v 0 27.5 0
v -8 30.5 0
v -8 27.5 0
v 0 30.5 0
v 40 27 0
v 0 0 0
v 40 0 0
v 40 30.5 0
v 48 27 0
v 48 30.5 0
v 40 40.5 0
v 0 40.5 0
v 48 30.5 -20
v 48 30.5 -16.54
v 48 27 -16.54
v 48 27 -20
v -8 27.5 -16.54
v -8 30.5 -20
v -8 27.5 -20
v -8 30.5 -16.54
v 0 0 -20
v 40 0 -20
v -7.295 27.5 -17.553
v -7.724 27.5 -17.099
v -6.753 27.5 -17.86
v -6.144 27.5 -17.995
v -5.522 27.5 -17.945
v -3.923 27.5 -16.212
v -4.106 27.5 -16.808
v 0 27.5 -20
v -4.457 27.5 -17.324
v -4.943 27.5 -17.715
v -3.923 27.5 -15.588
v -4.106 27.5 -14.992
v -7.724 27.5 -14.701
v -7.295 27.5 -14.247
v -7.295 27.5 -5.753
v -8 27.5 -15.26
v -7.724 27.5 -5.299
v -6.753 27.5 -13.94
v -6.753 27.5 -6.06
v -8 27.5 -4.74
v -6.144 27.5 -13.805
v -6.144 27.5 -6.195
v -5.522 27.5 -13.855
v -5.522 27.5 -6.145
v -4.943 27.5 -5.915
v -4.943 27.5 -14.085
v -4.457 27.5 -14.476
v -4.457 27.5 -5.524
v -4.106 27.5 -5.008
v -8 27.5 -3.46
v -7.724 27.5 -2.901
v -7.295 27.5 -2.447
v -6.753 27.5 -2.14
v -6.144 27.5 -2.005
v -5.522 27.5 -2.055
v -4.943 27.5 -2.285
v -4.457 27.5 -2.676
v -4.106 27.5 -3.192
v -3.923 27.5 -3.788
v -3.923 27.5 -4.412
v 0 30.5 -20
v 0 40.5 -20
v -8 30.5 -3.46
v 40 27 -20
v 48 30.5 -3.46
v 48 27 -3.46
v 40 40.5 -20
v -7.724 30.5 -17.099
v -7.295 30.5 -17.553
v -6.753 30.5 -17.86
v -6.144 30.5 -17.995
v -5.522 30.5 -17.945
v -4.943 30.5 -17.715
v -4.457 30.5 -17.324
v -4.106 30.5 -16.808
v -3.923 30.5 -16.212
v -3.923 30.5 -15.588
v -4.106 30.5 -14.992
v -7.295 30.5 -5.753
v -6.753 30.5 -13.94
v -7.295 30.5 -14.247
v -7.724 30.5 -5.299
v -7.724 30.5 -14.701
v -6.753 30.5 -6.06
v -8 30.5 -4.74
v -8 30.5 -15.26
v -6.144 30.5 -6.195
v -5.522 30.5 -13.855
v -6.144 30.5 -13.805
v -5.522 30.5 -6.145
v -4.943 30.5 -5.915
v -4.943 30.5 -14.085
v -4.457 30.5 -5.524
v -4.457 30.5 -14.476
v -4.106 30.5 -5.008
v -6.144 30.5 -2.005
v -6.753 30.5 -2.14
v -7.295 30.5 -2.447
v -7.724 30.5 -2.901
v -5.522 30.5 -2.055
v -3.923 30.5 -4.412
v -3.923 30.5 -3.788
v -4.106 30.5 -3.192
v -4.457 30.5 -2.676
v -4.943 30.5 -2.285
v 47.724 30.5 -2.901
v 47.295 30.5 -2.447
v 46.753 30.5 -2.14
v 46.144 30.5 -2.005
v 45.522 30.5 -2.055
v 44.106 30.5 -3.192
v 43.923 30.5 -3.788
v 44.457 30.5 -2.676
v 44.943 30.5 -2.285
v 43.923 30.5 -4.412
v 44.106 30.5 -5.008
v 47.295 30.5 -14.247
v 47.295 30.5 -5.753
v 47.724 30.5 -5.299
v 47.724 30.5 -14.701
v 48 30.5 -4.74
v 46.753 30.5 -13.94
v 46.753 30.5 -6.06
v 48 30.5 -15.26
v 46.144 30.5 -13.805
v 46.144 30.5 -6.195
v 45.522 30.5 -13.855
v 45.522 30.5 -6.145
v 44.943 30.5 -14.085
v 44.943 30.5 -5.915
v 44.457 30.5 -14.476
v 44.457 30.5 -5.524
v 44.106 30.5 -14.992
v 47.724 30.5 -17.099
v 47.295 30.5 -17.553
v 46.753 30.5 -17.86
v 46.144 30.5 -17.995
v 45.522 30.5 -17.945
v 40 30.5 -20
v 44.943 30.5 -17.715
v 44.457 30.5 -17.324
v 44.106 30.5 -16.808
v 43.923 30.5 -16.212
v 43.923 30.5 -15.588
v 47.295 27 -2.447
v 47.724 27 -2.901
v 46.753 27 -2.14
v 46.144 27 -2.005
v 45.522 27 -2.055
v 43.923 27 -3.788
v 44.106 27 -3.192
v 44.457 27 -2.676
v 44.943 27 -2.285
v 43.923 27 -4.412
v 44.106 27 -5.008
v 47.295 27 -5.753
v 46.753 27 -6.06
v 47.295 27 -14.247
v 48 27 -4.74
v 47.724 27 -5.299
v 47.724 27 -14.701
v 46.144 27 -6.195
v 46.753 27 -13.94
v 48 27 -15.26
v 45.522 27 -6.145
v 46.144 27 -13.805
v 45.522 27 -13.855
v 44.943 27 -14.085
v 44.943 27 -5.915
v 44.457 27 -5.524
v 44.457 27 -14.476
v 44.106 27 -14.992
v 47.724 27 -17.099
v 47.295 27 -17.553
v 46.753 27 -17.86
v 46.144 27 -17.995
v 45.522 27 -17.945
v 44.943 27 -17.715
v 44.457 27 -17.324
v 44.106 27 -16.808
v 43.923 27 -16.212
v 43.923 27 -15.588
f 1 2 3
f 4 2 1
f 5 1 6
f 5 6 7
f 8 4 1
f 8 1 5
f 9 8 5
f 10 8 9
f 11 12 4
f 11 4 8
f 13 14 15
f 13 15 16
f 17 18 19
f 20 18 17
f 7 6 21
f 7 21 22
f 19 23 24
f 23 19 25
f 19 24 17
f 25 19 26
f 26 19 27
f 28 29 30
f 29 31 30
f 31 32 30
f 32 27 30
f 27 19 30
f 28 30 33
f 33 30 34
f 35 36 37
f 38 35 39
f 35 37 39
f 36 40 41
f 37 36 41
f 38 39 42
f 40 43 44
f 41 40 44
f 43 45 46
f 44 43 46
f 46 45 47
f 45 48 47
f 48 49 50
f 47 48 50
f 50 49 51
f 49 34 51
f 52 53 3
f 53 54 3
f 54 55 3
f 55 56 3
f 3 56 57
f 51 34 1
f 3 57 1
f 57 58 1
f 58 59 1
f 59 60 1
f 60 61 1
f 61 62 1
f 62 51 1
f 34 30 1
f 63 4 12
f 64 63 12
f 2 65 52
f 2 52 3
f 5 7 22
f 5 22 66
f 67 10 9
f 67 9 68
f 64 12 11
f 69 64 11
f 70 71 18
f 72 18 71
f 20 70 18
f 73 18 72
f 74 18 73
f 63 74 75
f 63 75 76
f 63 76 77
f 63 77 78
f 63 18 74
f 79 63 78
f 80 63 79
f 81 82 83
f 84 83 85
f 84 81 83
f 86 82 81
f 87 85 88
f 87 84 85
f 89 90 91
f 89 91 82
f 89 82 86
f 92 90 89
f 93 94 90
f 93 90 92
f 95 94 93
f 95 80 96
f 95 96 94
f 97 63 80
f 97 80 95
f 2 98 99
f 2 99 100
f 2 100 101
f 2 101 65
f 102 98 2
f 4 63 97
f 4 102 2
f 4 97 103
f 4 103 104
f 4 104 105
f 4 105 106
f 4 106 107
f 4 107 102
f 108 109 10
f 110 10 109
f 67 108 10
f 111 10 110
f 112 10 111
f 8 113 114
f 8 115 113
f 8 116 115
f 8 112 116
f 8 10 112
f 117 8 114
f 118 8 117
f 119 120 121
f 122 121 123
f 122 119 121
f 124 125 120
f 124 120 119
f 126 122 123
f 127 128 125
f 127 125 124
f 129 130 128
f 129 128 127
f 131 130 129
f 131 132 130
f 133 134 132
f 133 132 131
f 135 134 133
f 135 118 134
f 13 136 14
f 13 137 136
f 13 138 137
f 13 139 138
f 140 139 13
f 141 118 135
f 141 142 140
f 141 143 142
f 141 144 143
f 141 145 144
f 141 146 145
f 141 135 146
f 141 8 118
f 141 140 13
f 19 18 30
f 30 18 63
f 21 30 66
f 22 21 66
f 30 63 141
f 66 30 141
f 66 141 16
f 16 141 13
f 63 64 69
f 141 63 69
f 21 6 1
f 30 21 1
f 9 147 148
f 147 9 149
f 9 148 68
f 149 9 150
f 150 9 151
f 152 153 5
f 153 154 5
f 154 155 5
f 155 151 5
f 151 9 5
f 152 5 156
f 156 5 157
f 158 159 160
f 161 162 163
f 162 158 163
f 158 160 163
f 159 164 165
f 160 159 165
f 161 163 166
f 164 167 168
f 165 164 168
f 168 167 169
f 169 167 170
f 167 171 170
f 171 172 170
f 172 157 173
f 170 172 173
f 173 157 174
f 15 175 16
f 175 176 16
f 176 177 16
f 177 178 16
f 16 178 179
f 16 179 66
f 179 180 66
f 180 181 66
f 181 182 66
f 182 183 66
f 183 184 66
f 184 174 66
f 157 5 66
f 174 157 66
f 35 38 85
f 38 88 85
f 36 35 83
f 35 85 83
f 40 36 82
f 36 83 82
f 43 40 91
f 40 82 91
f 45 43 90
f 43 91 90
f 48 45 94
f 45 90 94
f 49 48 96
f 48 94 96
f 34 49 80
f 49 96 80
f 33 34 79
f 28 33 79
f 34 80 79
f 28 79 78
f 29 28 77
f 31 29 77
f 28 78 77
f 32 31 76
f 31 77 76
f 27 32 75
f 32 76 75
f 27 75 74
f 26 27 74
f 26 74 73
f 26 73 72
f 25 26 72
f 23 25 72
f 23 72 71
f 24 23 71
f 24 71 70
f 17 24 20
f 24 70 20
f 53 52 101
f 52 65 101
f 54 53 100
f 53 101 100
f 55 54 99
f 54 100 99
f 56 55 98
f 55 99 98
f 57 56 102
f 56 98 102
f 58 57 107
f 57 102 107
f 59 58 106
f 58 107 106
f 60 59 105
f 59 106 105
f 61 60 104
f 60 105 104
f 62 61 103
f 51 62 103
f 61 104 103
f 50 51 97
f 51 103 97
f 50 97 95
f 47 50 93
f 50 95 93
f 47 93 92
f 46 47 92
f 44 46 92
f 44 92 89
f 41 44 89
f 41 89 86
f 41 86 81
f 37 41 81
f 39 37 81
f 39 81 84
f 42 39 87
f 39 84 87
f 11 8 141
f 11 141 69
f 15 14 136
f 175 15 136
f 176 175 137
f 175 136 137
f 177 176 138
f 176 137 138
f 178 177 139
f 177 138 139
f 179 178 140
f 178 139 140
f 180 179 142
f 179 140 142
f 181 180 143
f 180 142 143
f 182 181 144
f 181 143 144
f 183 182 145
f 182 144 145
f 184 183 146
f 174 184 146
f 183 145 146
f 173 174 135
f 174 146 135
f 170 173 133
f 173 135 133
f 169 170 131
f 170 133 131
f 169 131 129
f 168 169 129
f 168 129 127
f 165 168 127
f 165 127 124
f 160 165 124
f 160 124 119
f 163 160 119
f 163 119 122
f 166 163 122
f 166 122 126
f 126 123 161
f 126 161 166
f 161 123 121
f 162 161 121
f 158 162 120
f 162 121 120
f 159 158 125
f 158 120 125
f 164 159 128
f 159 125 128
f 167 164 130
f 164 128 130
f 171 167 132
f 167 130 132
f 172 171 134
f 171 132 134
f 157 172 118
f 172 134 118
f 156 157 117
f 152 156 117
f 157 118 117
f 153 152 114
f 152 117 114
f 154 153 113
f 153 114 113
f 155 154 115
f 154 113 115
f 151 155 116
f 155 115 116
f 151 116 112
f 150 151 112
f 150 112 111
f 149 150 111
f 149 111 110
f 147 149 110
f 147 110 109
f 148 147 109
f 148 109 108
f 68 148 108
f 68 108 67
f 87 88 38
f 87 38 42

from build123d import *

# Parameters (mm, degrees)
SKETCH2_W           = 40
SKETCH2_H           = 40.5
BOSS_EXTRUDE1_DEPTH = 20
SKETCH3_W           = 20
SKETCH3_H           = 3.5
BOSS_EXTRUDE2_DEPTH = 8
SKETCH4_R           = 2.1
CUT_EXTRUDE1_DEPTH  = 8
SKETCH5_W           = 20
SKETCH5_H           = 3
BOSS_EXTRUDE3_DEPTH = 8
SKETCH6_R           = 2.1
CUT_EXTRUDE2_DEPTH  = 8


with BuildPart() as part:
    # Sketch2 → Boss-Extrude1 (new body)
    with BuildSketch(Plane.XY):
        with Locations((20, 20.25)):
            Rectangle(SKETCH2_W, SKETCH2_H)
    extrude(amount=-BOSS_EXTRUDE1_DEPTH)

    # Sketch3 → Boss-Extrude2 (add)
    with BuildSketch(Plane(origin=(40, 0, 0), x_dir=(0, 0, -1), z_dir=(1, 0, 0))):
        with Locations((10, 28.75)):
            Rectangle(SKETCH3_W, SKETCH3_H)
    extrude(amount=BOSS_EXTRUDE2_DEPTH)

    # Sketch4 → Cut-Extrude1 (cut)
    with BuildSketch(Plane(origin=(0, 30.5, 0), x_dir=(1, 0, 0), z_dir=(0, 1, 0))):
        with Locations((46, 15.9)):
            Circle(SKETCH4_R)
        with Locations((46, 4.1)):
            Circle(SKETCH4_R)
    extrude(amount=-CUT_EXTRUDE1_DEPTH, mode=Mode.SUBTRACT)

    # Sketch5 → Boss-Extrude3 (add)
    with BuildSketch(Plane.ZY):
        with Locations((-10, 29)):
            Rectangle(SKETCH5_W, SKETCH5_H)
    extrude(amount=BOSS_EXTRUDE3_DEPTH)

    # Sketch6 → Cut-Extrude2 (cut)
    with BuildSketch(Plane(origin=(0, 30.5, 0), x_dir=(1, 0, 0), z_dir=(0, 1, 0))):
        with Locations((-6, 15.9)):
            Circle(SKETCH6_R)
        with Locations((-6, 4.1)):
            Circle(SKETCH6_R)
    extrude(amount=-CUT_EXTRUDE2_DEPTH, mode=Mode.SUBTRACT)


solid = part.part
